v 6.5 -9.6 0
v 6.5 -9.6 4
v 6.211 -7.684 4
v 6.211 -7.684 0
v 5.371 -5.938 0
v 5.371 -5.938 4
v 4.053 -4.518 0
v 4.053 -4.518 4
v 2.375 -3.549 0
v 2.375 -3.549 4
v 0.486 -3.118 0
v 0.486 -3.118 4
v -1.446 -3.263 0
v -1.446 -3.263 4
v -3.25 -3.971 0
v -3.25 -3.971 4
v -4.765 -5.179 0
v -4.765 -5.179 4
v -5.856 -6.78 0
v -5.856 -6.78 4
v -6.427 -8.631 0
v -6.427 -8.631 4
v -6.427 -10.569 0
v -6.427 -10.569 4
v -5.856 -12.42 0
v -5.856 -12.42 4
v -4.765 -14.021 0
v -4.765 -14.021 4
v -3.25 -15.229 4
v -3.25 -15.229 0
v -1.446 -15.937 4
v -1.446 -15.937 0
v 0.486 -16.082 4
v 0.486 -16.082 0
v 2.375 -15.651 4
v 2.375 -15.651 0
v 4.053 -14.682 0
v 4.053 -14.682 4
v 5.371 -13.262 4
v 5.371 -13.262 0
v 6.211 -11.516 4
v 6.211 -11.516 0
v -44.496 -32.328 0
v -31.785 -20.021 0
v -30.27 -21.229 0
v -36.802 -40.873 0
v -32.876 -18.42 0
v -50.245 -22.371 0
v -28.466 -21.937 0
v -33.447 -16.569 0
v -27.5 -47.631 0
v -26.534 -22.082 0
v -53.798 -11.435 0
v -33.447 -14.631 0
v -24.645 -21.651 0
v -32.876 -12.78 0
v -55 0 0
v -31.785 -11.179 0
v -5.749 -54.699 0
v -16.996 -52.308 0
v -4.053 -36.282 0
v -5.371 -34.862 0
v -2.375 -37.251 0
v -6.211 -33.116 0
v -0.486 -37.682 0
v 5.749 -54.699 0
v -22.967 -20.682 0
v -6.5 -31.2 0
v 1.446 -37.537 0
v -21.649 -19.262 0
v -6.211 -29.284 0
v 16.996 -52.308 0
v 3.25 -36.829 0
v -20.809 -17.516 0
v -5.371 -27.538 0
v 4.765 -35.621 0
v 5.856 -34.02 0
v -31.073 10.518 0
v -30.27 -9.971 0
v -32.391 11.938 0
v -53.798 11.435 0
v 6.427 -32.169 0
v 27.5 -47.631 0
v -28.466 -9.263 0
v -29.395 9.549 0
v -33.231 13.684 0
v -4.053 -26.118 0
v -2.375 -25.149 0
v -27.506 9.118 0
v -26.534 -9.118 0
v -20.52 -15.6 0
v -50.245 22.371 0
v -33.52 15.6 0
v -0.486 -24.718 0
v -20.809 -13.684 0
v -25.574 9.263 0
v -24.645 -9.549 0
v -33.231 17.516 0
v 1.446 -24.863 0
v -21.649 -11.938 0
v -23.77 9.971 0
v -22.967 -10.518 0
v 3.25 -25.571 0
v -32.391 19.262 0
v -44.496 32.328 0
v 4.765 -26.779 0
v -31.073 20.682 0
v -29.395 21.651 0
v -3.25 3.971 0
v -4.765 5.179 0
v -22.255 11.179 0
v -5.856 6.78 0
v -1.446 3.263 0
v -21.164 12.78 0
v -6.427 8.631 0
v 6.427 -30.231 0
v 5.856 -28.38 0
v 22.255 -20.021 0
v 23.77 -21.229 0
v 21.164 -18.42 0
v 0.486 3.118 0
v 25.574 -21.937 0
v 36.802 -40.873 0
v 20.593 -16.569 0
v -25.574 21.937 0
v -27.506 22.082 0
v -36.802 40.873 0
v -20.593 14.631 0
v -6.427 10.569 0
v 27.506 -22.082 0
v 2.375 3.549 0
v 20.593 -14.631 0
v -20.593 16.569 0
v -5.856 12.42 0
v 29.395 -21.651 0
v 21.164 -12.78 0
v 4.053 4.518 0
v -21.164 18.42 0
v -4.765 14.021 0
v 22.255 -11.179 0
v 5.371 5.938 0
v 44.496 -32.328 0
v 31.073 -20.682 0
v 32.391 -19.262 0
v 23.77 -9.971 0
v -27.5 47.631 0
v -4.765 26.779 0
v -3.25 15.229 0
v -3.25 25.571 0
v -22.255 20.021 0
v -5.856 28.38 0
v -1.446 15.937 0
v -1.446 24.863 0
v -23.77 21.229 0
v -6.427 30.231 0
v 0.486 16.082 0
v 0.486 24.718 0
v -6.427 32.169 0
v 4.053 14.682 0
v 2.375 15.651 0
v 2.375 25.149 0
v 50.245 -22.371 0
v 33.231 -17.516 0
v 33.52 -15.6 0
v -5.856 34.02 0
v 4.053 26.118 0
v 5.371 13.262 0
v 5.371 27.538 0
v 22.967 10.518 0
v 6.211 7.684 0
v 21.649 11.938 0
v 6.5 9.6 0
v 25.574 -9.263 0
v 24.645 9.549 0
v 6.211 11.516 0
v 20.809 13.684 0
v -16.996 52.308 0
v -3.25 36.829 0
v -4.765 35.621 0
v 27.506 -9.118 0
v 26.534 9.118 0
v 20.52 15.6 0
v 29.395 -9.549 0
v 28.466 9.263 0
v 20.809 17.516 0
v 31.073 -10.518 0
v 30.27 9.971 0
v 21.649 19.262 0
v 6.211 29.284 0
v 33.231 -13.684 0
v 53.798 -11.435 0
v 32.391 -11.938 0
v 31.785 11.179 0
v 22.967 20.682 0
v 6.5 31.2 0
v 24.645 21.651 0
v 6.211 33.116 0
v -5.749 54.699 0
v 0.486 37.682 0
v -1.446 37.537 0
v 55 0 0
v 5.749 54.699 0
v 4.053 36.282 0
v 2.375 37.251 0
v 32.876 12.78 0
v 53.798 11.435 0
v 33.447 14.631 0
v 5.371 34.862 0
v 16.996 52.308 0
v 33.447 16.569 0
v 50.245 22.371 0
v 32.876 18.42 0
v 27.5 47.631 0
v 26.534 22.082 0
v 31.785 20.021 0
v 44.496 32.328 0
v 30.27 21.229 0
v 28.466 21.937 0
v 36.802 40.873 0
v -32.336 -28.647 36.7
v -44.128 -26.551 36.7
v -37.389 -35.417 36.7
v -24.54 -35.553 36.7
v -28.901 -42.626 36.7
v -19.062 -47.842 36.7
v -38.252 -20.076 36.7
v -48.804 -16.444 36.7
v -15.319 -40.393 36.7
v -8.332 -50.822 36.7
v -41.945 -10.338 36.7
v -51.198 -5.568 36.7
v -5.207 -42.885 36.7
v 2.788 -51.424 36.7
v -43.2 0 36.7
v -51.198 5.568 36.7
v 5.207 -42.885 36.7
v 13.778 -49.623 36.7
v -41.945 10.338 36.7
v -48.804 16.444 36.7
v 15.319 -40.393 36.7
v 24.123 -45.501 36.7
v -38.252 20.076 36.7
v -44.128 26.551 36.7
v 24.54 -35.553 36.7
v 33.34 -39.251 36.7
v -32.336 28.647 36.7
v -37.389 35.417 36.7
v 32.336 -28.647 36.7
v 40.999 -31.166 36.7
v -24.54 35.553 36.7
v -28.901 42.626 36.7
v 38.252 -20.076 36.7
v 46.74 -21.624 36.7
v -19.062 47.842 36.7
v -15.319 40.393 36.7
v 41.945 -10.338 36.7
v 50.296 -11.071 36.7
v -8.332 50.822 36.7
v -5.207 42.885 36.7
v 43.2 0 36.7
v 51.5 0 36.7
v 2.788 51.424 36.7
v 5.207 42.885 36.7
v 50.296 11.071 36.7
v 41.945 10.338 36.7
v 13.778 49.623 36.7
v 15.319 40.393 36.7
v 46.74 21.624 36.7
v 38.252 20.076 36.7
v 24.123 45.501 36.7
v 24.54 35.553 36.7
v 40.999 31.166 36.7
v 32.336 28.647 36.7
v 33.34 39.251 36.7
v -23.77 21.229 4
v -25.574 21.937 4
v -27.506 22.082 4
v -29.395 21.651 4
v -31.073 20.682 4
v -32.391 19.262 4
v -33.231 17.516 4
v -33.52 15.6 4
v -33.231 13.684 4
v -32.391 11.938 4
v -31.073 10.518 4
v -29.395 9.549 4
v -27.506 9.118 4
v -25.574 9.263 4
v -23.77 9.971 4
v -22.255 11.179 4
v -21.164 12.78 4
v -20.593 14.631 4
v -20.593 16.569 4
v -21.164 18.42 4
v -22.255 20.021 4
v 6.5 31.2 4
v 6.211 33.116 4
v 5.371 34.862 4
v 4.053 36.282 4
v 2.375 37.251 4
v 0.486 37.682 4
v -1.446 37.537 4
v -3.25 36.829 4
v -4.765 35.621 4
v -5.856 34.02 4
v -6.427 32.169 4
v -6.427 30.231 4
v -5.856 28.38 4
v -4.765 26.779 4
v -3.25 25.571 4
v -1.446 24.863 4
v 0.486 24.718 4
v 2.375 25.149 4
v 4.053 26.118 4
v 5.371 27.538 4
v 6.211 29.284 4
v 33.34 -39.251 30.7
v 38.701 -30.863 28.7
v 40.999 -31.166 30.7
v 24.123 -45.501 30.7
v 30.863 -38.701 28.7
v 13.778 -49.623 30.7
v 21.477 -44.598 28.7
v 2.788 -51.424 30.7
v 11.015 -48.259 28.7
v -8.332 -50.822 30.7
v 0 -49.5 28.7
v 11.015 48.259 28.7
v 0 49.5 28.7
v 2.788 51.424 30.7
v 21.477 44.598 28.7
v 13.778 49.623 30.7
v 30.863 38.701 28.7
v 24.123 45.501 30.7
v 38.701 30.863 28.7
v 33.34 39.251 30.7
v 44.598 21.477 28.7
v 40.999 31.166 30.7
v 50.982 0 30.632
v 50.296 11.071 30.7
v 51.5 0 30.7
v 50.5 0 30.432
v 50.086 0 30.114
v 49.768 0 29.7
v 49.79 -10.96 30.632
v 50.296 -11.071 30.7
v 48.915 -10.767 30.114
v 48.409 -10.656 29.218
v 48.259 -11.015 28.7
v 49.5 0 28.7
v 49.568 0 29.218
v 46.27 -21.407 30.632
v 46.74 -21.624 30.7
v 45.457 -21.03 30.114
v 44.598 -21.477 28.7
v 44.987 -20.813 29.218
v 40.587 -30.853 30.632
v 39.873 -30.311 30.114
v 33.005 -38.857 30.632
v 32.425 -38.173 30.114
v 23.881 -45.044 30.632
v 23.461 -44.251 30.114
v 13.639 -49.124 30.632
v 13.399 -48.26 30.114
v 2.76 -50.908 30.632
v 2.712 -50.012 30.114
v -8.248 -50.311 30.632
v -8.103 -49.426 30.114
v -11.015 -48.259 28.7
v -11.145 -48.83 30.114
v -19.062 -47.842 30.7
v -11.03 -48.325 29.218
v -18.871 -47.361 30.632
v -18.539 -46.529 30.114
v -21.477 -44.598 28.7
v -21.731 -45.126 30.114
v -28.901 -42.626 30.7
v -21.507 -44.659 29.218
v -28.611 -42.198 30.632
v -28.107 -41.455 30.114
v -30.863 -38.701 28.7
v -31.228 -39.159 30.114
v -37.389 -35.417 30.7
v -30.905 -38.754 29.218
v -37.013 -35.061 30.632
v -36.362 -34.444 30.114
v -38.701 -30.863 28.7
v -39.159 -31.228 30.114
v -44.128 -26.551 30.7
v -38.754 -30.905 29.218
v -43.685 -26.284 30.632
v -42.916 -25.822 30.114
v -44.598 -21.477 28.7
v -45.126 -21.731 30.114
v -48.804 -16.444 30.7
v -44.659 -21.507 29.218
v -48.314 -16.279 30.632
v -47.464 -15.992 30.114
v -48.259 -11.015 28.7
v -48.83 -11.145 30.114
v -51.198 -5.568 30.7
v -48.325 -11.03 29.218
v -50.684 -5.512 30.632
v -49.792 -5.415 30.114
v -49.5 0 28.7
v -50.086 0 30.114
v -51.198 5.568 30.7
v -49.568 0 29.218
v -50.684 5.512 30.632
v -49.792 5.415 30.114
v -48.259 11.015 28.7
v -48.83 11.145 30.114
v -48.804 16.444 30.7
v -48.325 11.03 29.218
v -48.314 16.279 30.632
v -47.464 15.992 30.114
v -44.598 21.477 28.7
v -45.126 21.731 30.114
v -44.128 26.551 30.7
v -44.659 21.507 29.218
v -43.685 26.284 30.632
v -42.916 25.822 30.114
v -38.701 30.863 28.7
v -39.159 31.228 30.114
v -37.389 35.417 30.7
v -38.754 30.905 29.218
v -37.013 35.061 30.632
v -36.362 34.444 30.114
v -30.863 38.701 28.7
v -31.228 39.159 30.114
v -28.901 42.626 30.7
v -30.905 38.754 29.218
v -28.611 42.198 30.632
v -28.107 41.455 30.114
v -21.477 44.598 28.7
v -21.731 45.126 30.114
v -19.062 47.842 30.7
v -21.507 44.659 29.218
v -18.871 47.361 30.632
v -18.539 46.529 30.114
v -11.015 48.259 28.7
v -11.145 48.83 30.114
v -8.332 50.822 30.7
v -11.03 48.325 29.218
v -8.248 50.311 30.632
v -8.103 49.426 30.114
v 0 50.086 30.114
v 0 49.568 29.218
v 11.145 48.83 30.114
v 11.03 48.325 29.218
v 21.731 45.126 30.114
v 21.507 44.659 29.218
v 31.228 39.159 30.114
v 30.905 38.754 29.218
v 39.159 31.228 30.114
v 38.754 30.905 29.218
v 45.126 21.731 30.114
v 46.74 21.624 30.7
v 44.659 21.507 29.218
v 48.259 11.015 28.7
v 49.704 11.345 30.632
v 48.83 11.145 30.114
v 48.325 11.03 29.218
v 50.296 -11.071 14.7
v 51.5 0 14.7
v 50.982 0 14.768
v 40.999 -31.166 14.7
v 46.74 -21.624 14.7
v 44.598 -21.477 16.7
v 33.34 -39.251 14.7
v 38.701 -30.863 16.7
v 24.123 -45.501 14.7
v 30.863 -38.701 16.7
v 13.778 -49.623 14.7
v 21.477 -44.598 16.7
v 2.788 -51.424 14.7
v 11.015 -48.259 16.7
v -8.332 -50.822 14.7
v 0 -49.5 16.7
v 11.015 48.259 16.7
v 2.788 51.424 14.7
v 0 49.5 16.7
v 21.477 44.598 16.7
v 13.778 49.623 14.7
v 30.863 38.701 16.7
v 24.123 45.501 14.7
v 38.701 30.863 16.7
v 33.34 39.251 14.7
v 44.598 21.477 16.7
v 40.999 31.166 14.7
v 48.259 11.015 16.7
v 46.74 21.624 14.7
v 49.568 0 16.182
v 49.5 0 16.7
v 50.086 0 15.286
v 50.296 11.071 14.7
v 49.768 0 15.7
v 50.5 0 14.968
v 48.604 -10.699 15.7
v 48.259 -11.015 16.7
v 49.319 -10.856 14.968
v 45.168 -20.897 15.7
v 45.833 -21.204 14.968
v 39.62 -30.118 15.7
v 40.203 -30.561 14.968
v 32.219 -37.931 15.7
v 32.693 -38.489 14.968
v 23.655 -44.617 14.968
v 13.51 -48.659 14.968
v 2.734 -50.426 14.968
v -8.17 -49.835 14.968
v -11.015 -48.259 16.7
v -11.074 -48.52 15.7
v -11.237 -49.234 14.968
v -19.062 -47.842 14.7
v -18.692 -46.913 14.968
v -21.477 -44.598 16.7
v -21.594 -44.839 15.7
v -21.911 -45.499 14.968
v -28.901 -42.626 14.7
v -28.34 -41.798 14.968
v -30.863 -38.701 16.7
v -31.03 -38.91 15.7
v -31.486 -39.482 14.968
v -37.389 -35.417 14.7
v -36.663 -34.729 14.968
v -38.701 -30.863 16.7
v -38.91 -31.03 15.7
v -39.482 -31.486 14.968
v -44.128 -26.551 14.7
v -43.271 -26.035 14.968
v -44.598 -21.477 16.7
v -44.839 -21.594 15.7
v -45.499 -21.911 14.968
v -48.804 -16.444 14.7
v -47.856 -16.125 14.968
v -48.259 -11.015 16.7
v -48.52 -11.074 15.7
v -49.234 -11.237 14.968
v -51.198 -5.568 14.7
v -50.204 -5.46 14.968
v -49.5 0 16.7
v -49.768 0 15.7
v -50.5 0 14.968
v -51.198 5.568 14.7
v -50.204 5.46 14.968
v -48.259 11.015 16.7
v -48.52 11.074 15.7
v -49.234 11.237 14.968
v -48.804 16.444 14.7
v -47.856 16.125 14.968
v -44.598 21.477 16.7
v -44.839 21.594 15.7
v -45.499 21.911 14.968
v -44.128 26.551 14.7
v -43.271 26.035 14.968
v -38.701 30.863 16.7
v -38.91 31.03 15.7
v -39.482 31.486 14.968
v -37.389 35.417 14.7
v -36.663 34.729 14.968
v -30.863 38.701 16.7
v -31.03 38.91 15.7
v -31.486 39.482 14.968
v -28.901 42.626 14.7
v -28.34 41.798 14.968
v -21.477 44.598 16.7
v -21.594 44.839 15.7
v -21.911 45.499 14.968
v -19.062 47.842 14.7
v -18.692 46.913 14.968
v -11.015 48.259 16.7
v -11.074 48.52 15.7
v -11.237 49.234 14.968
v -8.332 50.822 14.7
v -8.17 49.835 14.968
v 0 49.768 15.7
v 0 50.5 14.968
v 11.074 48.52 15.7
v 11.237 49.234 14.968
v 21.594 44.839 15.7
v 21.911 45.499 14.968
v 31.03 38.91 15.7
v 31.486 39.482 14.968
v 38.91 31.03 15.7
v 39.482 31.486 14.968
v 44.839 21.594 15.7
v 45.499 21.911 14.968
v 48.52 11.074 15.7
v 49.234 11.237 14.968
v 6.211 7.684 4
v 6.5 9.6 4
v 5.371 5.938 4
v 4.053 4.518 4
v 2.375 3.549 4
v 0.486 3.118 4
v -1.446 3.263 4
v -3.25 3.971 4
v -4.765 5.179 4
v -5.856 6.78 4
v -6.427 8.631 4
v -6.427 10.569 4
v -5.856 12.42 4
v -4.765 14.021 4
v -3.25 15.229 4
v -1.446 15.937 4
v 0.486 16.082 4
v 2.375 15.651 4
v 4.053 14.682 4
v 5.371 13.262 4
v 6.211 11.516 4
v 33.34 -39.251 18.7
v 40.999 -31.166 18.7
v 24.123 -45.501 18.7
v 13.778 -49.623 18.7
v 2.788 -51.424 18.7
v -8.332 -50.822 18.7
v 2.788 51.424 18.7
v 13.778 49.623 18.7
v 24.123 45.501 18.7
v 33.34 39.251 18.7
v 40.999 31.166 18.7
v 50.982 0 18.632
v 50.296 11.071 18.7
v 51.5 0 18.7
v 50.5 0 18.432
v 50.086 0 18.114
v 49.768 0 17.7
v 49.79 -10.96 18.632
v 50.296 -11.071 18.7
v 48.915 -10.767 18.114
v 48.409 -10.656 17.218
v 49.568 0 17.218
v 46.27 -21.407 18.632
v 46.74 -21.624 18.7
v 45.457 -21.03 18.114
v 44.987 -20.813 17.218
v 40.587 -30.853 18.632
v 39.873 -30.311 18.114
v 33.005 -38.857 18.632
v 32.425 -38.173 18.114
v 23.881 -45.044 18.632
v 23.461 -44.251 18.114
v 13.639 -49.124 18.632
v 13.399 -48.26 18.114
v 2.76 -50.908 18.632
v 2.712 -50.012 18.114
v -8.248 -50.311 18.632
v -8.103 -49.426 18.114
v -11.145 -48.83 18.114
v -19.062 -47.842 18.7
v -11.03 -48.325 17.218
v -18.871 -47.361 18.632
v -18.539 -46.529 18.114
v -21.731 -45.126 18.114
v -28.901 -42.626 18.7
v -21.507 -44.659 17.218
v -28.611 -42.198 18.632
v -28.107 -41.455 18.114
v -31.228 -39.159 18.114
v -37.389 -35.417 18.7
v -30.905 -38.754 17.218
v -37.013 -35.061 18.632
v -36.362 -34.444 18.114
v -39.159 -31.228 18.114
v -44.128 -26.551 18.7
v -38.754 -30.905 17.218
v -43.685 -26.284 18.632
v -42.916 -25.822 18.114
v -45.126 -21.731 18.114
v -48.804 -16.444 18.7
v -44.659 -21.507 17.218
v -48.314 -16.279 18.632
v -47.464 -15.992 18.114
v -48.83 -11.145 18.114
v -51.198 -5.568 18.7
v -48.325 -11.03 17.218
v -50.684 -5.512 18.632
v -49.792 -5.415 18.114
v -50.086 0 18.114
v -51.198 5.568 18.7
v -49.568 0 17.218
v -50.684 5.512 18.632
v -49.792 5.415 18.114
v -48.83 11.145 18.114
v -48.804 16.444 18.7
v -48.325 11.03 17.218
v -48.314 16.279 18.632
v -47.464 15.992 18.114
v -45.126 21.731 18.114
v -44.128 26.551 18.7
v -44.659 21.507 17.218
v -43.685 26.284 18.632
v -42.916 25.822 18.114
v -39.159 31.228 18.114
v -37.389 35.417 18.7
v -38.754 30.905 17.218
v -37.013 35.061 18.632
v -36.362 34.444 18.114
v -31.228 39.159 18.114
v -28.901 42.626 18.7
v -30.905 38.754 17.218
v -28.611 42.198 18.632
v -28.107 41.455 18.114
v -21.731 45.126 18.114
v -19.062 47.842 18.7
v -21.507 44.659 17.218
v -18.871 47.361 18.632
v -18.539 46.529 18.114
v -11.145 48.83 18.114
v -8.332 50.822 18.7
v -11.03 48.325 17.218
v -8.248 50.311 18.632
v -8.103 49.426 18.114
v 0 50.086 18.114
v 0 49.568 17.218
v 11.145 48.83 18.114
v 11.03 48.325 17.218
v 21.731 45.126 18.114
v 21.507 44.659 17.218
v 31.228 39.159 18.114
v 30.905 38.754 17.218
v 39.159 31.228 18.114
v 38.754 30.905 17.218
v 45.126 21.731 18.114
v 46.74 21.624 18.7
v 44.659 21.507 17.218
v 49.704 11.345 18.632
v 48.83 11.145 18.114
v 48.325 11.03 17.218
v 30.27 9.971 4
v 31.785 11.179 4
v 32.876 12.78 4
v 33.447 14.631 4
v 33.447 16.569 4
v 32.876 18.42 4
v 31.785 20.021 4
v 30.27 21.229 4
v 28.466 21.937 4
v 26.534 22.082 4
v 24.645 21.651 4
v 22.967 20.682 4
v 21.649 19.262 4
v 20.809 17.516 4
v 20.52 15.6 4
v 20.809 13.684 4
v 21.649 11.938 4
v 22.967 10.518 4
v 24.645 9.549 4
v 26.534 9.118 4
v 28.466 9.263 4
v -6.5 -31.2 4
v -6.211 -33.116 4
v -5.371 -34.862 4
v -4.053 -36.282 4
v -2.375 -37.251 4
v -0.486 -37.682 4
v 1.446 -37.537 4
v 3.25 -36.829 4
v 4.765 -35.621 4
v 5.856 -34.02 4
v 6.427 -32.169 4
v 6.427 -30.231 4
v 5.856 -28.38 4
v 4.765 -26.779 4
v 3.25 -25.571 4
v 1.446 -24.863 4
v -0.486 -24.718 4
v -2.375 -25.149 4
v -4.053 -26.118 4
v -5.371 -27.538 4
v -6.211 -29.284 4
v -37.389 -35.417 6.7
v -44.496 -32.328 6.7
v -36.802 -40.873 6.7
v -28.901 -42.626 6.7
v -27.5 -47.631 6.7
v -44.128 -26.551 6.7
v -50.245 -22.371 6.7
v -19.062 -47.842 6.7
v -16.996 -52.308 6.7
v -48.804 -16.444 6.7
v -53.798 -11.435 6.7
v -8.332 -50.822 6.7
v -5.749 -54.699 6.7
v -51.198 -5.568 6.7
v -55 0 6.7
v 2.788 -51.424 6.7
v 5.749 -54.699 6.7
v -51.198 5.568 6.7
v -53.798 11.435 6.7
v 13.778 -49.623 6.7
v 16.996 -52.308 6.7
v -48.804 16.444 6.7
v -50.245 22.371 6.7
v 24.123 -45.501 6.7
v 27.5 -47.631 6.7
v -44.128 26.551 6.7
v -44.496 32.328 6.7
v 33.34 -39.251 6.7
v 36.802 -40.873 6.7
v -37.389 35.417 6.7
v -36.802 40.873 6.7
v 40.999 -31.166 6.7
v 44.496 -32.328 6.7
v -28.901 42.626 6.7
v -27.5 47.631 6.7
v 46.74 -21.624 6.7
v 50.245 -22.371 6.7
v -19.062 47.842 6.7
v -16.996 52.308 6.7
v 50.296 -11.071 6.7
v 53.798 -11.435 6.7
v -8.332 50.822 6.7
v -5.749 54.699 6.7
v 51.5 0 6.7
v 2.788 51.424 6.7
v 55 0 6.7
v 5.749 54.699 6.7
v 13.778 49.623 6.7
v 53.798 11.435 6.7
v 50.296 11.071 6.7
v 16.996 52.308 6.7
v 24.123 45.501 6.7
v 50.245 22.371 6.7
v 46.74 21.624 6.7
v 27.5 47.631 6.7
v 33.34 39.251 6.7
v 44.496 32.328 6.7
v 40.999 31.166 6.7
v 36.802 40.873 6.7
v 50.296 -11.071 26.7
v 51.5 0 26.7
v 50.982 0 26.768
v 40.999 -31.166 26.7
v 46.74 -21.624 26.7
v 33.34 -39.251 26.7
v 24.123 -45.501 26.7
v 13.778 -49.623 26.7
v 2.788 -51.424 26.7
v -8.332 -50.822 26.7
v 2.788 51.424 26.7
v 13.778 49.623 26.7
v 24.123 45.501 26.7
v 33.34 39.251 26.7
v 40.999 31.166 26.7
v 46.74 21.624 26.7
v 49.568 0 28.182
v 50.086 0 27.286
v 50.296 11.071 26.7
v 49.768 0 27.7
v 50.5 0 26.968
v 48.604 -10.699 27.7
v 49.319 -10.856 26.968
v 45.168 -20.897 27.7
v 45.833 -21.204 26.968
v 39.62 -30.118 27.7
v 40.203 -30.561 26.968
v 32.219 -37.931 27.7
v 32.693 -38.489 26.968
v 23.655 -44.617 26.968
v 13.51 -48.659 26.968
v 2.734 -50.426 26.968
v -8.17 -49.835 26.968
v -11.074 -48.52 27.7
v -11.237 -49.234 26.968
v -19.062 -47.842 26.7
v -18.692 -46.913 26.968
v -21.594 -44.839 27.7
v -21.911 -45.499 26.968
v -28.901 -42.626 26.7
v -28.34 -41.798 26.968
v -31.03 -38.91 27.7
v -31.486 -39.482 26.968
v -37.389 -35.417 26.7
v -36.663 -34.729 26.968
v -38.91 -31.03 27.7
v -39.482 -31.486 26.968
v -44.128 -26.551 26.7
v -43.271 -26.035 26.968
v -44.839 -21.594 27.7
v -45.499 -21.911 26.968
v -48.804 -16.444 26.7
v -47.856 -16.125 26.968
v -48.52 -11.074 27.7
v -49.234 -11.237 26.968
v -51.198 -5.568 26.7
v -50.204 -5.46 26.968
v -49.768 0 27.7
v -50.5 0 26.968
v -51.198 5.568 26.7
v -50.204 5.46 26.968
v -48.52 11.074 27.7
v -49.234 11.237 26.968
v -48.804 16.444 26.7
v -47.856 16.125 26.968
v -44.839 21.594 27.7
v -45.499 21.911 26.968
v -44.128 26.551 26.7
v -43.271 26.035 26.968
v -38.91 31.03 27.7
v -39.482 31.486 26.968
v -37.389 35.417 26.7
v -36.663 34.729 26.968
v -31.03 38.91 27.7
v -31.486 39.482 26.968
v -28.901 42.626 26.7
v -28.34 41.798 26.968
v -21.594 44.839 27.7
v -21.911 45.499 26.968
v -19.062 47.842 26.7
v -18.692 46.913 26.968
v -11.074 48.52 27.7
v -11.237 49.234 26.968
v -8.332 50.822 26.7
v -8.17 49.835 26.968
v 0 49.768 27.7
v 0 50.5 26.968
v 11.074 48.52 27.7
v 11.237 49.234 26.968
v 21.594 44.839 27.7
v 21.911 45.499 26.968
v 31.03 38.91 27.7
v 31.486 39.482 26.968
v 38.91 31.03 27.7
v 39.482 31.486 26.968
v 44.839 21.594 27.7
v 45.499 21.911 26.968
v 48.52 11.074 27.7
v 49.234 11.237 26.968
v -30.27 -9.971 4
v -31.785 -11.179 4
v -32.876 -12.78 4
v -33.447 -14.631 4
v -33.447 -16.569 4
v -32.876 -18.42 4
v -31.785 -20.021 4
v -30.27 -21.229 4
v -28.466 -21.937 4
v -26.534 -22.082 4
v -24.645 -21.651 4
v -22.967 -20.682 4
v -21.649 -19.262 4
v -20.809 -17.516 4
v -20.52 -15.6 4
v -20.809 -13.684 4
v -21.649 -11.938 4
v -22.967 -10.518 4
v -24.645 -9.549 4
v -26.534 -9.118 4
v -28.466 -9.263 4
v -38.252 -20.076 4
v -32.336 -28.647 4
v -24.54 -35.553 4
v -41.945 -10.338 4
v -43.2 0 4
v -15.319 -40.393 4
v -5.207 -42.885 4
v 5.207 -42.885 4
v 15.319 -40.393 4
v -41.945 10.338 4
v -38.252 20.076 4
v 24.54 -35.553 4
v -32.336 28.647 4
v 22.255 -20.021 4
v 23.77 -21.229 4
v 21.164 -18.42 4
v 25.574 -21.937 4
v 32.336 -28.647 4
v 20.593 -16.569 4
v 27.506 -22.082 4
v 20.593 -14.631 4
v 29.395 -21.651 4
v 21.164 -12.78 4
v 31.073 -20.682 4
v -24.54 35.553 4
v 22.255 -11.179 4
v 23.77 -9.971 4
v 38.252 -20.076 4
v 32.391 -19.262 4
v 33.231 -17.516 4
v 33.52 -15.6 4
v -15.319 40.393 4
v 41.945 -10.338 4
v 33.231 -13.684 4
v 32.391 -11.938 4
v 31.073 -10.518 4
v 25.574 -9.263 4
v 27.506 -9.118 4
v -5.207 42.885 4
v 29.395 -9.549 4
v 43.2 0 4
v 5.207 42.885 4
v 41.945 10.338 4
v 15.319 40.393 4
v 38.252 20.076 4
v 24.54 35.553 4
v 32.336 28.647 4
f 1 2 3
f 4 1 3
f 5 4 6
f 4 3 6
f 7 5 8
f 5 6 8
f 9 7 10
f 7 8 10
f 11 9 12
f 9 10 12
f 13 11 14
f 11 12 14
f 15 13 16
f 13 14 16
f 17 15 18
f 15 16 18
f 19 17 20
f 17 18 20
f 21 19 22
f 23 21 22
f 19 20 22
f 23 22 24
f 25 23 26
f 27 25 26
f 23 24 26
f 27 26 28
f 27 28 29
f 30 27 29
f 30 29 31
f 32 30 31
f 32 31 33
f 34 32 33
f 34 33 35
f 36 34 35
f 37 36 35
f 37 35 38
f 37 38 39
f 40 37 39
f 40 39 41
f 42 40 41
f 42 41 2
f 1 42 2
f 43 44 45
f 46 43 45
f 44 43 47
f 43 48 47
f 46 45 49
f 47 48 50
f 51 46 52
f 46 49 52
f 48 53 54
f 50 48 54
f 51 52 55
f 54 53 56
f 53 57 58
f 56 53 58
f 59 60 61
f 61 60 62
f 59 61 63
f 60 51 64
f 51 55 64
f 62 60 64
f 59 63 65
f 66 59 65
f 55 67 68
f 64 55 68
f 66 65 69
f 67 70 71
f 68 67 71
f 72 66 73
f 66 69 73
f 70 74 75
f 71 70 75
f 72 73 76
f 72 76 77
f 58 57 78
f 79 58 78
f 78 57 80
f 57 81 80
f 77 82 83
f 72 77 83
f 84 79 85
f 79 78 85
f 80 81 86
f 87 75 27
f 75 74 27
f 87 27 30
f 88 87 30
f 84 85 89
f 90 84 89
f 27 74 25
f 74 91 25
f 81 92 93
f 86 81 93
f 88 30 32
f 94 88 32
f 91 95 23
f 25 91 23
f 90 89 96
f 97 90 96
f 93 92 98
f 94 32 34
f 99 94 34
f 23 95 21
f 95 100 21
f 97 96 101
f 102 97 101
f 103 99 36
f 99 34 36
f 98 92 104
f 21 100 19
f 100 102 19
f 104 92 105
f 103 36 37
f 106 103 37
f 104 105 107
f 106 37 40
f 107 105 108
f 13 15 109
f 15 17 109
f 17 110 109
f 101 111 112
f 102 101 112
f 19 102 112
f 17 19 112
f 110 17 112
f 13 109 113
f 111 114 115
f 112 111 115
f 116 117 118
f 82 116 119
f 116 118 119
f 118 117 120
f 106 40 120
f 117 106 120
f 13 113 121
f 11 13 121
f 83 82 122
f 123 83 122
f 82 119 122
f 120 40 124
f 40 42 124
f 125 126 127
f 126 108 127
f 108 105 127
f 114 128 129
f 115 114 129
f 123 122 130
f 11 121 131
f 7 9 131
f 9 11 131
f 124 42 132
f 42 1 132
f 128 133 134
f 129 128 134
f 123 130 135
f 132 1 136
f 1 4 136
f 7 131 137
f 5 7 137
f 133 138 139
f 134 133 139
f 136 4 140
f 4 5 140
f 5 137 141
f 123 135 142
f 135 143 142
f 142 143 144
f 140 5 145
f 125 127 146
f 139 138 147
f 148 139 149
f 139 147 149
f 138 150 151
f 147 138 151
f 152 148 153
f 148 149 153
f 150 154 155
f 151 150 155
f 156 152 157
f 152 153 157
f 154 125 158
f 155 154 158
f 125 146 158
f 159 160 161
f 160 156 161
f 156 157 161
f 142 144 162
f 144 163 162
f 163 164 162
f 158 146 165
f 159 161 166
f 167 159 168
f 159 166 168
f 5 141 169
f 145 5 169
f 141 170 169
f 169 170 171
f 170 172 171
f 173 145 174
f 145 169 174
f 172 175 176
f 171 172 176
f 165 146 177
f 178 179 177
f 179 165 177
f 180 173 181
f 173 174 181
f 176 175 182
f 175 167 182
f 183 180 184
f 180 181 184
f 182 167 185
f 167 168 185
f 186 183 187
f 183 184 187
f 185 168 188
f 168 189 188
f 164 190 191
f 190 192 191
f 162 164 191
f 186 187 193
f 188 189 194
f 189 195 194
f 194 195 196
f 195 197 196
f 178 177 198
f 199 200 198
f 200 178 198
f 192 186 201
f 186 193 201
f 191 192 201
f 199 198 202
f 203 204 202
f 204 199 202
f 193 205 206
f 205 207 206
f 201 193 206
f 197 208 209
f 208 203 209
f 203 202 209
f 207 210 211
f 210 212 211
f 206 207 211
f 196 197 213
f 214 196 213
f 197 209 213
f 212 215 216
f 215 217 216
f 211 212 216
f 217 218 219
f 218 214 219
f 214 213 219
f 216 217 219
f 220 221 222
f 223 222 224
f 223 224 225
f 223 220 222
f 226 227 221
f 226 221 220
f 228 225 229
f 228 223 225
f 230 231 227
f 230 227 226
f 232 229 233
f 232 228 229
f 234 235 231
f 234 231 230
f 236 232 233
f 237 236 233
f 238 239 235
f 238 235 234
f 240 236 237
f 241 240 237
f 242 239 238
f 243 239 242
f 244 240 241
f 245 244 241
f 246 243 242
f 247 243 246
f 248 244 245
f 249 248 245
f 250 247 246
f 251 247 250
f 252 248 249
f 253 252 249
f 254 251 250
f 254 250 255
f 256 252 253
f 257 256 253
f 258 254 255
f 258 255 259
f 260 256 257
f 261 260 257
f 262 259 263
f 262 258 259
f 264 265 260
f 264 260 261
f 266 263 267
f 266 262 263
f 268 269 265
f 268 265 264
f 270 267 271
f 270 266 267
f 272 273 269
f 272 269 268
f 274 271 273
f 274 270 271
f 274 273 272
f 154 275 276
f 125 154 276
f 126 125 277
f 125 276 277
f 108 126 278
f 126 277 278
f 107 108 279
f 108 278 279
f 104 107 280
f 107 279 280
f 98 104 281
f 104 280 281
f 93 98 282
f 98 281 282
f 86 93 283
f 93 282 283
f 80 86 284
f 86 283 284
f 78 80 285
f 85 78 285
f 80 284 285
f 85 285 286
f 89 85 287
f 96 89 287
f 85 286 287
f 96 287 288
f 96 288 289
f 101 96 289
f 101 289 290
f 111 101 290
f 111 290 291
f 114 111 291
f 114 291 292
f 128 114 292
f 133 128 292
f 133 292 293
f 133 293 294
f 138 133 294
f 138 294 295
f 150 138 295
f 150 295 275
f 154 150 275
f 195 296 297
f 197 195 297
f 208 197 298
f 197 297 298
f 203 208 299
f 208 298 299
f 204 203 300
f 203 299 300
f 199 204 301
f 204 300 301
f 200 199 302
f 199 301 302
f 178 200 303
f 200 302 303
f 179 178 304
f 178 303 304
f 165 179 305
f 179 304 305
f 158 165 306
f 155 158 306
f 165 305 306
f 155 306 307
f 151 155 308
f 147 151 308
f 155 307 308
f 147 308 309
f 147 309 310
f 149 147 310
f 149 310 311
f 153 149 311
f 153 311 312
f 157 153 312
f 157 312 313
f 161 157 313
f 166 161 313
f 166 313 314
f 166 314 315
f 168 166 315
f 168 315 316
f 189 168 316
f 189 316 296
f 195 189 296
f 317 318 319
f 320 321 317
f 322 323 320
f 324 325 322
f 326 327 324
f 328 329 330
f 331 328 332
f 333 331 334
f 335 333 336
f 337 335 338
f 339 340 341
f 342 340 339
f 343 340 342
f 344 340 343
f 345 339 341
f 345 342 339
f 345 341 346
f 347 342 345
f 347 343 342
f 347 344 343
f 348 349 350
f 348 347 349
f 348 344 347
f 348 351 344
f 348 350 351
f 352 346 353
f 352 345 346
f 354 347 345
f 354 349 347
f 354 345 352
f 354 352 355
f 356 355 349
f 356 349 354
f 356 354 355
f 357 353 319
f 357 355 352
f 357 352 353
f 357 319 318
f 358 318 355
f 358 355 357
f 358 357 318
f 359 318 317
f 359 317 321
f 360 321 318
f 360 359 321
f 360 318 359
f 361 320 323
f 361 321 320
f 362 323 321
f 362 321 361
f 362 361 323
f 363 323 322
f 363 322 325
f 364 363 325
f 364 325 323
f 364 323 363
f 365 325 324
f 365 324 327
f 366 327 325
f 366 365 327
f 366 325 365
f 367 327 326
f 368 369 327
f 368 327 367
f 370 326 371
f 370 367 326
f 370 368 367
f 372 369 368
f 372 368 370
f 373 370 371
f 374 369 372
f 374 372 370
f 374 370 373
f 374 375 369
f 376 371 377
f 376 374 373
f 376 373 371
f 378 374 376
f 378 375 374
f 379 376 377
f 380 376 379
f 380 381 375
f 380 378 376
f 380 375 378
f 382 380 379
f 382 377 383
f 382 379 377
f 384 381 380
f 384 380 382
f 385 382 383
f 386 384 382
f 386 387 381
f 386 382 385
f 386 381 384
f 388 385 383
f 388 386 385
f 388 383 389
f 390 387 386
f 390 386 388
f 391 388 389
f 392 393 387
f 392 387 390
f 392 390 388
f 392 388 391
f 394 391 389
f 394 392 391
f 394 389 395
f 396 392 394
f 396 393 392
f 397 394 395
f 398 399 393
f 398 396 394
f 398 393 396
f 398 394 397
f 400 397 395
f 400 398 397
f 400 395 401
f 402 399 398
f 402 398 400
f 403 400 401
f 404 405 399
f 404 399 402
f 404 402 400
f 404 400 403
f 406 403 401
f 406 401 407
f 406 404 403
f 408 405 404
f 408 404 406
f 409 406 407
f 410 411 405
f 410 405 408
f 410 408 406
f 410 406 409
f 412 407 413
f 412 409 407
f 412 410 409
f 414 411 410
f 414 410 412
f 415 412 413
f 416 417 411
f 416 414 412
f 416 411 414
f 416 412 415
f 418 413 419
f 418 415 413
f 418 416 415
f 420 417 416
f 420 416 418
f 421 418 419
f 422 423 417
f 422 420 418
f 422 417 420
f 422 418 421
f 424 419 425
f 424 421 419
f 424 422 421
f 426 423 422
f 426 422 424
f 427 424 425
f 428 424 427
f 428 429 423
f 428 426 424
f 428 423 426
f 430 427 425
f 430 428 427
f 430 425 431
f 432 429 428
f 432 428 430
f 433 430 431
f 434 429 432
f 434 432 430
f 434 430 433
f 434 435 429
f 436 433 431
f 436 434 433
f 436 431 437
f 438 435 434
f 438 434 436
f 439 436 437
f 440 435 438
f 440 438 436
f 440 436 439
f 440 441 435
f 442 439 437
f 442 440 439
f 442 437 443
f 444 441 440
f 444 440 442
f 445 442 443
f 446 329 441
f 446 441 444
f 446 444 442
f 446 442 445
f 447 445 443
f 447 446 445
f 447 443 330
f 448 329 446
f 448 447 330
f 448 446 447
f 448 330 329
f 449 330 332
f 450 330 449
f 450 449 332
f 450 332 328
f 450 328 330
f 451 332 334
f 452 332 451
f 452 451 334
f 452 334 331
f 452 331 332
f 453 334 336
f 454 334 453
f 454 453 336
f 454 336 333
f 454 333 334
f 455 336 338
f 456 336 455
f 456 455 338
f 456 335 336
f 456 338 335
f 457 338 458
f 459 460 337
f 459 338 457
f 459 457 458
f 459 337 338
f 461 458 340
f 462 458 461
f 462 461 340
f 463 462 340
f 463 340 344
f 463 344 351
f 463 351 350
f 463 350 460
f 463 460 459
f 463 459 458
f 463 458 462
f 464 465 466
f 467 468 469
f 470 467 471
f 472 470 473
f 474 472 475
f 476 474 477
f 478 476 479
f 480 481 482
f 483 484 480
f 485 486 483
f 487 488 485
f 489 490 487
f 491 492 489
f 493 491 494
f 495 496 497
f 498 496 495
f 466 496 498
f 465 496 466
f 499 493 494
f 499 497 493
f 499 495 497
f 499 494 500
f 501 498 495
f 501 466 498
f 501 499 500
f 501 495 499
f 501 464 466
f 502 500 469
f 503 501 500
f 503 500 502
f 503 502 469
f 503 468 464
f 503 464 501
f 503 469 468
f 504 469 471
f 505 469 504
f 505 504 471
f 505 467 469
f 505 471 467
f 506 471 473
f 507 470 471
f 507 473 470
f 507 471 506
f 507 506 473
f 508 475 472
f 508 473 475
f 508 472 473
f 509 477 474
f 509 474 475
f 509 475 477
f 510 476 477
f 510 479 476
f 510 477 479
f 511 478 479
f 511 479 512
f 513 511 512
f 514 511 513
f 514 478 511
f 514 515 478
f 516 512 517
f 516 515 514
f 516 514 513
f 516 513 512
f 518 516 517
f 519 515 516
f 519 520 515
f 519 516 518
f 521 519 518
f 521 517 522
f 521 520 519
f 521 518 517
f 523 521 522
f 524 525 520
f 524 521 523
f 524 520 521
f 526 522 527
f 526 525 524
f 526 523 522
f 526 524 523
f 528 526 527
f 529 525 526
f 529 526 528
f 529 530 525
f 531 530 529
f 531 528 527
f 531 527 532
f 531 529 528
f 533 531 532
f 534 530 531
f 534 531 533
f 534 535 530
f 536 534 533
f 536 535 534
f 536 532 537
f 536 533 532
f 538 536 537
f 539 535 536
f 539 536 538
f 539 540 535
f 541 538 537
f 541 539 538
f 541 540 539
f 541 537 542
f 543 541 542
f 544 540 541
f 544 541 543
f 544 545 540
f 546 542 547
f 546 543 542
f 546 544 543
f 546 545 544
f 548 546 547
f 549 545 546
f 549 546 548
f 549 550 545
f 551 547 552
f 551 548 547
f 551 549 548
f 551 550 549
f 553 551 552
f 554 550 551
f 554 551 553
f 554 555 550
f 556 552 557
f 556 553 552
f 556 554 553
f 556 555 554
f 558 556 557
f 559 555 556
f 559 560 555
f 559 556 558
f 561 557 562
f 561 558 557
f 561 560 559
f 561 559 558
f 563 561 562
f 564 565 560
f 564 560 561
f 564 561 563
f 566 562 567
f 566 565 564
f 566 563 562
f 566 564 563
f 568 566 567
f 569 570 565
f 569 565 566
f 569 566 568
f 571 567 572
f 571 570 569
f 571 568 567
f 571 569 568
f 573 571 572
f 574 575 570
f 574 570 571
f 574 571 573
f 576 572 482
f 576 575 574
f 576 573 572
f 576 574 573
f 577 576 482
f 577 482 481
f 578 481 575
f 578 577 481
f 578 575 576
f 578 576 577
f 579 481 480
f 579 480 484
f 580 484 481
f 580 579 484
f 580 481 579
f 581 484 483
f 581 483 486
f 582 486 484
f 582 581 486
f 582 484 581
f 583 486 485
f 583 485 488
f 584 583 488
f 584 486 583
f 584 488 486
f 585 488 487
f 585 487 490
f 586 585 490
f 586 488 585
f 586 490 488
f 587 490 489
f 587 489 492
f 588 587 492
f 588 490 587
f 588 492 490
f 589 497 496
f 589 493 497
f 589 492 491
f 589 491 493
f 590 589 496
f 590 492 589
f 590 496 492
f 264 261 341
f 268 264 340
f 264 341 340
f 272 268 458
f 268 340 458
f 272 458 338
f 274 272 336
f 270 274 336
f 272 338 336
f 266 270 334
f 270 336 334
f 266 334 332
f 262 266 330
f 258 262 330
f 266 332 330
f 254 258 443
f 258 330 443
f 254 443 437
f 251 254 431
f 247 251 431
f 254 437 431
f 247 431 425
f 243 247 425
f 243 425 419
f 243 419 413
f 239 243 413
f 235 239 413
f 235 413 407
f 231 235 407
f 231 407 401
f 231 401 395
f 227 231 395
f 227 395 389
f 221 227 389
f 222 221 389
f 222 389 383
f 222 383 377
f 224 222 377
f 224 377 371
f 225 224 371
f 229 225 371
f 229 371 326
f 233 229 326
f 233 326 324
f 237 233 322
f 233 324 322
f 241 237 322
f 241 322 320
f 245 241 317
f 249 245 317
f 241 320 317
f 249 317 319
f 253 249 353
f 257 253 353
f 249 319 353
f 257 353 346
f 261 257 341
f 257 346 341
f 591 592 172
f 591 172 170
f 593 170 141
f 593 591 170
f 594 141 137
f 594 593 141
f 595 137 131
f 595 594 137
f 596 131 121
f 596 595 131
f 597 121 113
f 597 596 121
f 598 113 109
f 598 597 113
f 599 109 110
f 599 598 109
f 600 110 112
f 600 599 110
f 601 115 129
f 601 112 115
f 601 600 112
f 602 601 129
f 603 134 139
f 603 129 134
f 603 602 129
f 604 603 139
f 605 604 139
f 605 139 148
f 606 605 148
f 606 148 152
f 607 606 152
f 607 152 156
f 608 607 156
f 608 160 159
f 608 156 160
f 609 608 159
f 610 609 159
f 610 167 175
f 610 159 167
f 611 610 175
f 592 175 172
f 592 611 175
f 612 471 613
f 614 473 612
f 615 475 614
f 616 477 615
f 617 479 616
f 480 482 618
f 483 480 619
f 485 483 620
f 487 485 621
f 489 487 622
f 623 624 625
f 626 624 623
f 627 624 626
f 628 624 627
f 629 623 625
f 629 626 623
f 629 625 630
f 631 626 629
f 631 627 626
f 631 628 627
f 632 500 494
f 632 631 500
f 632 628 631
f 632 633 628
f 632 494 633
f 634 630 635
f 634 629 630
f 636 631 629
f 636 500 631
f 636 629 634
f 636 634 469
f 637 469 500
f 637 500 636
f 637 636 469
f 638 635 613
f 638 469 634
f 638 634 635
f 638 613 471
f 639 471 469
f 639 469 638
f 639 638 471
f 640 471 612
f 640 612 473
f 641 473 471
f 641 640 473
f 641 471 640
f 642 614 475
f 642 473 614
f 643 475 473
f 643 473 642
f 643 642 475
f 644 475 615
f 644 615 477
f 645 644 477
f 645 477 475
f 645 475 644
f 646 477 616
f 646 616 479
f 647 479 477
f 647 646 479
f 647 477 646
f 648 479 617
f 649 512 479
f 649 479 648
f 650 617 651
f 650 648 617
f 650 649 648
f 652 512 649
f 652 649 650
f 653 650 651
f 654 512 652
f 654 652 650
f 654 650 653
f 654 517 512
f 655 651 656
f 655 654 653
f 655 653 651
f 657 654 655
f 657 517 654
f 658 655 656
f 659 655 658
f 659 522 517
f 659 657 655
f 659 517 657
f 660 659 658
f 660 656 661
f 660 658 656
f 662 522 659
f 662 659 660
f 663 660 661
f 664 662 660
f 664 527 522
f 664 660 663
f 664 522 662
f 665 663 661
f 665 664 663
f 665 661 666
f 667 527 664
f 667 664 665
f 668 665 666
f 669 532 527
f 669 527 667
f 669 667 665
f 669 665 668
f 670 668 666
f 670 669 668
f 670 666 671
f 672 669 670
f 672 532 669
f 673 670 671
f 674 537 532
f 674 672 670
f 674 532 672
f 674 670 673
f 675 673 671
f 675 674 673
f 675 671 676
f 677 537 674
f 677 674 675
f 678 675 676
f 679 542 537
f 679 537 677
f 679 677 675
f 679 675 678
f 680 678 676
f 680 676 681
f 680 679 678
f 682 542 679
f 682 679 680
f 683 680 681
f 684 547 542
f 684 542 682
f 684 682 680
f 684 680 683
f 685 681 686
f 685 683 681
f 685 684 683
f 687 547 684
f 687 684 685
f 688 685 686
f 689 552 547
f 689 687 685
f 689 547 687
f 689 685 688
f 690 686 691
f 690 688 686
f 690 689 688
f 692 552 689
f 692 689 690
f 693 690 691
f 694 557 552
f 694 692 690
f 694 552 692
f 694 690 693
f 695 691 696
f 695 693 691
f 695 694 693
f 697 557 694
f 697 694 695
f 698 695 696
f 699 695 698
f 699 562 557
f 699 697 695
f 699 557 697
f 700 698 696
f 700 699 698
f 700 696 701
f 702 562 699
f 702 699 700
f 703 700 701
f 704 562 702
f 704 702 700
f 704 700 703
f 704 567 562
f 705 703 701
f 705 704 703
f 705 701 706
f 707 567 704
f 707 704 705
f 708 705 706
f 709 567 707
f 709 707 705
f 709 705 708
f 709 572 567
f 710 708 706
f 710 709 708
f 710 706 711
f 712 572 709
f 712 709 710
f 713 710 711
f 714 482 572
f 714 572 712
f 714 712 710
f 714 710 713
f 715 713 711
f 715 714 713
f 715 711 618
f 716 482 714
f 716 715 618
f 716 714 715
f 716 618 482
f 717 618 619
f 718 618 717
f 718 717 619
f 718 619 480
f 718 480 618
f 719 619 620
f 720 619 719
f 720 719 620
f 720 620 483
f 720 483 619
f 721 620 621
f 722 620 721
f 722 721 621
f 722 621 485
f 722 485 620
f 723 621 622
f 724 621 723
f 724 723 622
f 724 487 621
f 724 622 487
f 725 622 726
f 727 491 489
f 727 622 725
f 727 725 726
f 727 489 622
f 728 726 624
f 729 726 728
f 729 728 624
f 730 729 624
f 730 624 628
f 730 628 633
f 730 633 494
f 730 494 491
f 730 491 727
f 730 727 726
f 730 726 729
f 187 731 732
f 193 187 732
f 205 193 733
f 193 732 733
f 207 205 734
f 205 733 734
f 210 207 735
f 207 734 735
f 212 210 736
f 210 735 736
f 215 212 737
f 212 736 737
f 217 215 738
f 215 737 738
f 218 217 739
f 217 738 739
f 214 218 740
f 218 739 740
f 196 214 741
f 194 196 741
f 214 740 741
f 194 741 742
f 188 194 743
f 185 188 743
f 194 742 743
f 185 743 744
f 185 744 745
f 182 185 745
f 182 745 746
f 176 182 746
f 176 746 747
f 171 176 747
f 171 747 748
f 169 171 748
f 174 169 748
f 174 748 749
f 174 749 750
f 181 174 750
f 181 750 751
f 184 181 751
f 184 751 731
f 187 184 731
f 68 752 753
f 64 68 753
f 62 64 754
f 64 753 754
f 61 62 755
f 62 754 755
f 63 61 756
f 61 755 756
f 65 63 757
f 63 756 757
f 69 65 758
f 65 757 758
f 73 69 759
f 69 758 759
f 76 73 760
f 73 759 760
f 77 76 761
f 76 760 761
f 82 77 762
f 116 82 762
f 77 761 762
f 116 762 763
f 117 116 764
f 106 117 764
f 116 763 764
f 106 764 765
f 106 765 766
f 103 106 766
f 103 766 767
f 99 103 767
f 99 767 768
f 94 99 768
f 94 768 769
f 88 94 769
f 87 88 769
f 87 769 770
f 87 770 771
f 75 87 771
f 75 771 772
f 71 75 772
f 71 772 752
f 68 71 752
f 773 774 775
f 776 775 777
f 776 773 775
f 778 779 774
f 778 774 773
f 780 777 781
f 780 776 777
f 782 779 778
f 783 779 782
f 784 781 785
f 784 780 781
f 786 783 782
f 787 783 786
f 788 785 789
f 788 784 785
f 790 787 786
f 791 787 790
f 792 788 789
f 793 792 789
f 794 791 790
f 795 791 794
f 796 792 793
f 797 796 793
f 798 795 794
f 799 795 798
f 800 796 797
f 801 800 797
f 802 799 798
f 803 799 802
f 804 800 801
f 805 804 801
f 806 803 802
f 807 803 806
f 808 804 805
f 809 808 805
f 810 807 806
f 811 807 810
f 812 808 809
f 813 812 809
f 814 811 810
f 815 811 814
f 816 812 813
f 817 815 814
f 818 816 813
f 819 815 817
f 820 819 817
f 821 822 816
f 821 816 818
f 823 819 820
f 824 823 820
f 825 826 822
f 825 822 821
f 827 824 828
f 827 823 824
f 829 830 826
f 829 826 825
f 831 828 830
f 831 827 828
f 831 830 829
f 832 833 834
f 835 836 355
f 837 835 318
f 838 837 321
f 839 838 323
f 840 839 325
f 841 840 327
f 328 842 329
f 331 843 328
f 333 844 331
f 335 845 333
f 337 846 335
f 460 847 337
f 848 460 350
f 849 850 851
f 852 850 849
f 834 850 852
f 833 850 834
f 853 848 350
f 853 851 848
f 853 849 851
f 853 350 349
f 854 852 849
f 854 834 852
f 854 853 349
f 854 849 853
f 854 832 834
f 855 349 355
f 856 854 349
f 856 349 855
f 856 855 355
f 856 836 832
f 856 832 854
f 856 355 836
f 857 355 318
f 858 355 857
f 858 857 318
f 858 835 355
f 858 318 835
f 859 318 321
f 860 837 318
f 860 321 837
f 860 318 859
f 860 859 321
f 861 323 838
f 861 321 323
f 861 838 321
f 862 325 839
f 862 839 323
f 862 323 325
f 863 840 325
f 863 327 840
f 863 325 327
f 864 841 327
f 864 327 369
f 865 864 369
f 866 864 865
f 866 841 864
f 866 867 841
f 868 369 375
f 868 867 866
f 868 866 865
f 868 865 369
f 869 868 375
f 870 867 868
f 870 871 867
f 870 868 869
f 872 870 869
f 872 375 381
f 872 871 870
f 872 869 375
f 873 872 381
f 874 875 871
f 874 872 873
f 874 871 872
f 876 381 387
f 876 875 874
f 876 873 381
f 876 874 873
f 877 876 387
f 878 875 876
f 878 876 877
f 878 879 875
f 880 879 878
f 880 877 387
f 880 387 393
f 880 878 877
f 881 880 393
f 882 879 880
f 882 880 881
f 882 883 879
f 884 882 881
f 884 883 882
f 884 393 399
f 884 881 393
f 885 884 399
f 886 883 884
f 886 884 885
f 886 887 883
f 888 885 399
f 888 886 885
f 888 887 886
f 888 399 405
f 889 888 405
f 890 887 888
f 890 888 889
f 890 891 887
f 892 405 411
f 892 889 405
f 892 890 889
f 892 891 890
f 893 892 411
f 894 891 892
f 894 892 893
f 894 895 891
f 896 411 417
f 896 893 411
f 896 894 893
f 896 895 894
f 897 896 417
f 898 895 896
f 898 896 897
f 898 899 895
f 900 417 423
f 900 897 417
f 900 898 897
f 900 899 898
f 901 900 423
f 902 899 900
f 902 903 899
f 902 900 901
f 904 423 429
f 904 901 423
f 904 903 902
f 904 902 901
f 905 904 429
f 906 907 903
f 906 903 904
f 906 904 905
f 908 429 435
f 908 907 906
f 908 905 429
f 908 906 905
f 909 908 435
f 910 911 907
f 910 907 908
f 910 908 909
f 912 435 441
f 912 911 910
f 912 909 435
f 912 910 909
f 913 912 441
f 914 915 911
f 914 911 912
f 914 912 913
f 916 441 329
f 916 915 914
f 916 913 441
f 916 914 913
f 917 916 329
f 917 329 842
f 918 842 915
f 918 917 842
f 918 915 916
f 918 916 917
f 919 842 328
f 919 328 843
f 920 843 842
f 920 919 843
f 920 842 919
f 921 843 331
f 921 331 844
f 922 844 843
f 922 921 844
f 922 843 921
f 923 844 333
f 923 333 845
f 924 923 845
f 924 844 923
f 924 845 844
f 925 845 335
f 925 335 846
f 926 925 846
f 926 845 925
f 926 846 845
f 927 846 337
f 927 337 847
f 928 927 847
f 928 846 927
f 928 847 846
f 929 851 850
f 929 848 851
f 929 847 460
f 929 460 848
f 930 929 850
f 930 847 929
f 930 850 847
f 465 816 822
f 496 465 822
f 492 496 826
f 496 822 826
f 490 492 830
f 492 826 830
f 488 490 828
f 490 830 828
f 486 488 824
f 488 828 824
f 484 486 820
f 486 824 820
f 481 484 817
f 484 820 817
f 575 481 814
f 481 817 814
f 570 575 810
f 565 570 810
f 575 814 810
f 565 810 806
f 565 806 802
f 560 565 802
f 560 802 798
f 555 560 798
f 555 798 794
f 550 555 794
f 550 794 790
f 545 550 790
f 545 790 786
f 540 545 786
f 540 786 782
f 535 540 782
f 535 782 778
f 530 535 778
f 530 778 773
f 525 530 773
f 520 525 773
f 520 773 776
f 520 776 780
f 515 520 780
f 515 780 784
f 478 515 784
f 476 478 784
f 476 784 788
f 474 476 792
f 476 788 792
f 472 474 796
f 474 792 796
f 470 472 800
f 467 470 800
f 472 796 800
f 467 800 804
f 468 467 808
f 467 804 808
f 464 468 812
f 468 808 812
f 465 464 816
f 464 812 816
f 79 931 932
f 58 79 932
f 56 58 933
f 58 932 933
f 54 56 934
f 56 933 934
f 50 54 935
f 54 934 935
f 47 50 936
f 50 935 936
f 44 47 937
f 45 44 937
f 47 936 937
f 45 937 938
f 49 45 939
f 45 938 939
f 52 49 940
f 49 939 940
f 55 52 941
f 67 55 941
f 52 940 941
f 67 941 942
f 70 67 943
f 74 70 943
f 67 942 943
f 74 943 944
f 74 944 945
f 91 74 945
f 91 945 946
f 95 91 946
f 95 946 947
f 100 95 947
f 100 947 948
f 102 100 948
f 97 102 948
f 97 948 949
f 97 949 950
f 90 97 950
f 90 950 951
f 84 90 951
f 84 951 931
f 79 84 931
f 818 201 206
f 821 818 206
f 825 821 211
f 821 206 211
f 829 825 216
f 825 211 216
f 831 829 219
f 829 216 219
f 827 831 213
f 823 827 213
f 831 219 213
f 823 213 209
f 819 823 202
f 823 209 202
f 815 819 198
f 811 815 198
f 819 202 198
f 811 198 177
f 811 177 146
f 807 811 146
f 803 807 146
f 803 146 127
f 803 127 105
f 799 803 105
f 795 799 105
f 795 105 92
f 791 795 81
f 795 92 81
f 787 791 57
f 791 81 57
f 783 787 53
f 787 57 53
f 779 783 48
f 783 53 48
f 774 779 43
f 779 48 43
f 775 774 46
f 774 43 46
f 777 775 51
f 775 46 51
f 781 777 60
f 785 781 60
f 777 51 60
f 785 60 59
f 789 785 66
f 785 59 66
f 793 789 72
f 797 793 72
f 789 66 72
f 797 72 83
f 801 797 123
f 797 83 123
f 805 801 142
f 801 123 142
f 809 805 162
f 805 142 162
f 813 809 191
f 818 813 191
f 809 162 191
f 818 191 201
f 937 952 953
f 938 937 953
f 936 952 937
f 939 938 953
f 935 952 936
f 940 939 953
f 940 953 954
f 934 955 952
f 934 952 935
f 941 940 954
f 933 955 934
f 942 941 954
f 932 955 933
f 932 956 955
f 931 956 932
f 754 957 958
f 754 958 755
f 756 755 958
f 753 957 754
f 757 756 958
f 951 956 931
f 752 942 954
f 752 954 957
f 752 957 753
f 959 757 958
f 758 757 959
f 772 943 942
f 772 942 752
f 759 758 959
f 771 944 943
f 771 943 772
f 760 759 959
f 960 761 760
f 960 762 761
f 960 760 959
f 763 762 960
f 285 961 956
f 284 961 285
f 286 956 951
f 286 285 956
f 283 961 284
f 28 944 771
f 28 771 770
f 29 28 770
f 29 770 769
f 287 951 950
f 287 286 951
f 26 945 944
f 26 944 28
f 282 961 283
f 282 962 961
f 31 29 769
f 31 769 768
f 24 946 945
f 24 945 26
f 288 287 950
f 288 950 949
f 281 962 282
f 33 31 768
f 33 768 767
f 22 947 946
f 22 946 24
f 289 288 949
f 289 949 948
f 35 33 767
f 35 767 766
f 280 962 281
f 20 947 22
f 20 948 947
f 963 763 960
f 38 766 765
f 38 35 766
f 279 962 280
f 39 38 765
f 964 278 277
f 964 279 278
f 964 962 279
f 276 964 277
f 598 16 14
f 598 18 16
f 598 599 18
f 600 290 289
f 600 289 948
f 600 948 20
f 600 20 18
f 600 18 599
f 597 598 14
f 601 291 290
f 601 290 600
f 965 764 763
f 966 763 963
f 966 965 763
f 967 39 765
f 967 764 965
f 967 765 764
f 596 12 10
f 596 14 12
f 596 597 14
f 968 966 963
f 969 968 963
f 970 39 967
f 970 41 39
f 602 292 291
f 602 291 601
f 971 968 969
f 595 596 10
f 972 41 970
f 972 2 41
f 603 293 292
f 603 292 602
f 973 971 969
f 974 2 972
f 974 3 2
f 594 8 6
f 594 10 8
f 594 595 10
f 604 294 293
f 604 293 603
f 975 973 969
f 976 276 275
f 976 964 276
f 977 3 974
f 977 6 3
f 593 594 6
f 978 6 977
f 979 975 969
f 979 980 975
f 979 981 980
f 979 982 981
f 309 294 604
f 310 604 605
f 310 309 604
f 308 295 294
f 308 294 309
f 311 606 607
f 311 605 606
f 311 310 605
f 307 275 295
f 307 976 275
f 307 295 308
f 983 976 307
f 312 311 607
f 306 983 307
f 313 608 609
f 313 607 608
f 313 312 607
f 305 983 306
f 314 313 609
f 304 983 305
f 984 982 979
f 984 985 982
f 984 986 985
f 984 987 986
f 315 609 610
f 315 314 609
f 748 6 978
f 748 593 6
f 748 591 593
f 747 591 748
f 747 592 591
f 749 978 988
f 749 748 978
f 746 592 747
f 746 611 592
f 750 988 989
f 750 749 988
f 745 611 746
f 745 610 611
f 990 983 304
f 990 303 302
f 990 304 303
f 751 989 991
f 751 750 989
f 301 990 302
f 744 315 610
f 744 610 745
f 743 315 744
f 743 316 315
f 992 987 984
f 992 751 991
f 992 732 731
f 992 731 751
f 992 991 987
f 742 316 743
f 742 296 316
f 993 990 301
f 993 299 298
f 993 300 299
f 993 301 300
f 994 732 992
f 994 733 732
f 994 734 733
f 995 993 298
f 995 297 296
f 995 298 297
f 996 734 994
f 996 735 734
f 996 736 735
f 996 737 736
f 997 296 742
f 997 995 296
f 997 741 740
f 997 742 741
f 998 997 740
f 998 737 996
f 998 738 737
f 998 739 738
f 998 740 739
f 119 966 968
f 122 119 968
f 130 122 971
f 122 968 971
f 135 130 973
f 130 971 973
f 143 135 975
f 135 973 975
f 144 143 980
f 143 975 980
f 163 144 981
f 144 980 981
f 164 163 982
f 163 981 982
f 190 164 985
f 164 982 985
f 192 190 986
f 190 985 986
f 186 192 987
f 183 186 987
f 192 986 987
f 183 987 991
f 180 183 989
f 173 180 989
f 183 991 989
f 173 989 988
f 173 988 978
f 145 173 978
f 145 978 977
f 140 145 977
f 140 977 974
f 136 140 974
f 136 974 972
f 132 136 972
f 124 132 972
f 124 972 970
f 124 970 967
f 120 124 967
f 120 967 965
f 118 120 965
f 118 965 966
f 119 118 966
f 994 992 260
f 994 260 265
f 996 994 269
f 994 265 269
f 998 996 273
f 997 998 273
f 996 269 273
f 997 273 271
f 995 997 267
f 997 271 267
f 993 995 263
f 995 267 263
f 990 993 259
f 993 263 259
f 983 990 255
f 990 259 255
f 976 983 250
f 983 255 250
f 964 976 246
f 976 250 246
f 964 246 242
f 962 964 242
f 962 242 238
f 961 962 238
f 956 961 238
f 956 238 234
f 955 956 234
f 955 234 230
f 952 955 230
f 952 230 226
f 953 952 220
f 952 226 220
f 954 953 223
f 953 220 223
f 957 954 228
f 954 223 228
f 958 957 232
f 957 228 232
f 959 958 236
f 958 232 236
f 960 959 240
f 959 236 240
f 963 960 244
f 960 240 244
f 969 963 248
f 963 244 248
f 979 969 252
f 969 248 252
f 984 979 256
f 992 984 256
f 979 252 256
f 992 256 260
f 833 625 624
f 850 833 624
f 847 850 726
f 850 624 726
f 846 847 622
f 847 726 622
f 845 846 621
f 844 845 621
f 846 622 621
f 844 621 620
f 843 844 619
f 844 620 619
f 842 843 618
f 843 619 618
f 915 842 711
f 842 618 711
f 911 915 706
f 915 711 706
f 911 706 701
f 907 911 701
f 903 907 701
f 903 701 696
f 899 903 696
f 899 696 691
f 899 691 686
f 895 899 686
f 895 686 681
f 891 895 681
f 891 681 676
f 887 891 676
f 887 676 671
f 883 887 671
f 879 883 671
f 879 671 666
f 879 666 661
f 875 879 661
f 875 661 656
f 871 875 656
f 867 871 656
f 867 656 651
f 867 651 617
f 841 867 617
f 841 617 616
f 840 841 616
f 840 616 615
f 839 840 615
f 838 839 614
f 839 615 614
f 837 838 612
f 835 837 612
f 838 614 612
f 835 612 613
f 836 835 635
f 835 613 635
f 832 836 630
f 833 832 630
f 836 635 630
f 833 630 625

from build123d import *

# Parameters (mm, degrees)
CROQUIS1_R                    = 55
SALIENTE_EXTRUIR1_DEPTH       = 6.7
CROQUIS2_R                    = 51.5
SALIENTE_EXTRUIR2_DEPTH       = 30
CROQUIS3_R                    = 2
CROQUIS4_R                    = 43.2
CORTAR_EXTRUIR1_DEPTH         = 32.7
TALADRO_DE_MARGEN_PARA_M121_D = 13
MATRIZC1_COUNT                = 6
TALADRO_DE_MARGEN_PARA_M122_D = 13


with BuildPart() as part:
    # Croquis1 → Saliente-Extruir1 (new body)
    with BuildSketch(Plane.XY):
        Circle(CROQUIS1_R)
    extrude(amount=SALIENTE_EXTRUIR1_DEPTH)

    # Croquis2 → Saliente-Extruir2 (add)
    with BuildSketch(Plane.XY.offset(6.7)):
        Circle(CROQUIS2_R)
    extrude(amount=SALIENTE_EXTRUIR2_DEPTH)

    # Croquis3 → Cortar-Revolución1 (revolve, cut)
    with BuildSketch(Plane(origin=(0, 0, 0), x_dir=(1, 0, 0), z_dir=(0, 1, 0)), mode=Mode.PRIVATE) as cortar_revoluci_n1_sk:
        with Locations((-51.5, -16.7)):
            Circle(CROQUIS3_R)
        with Locations((-51.5, -28.7)):
            Circle(CROQUIS3_R)
    revolve(cortar_revoluci_n1_sk.sketch.rotate(Axis((0, 0, 36.878025431), (0, 0, -1)), 180), axis=Axis((0, 0, 36.878025431), (0, 0, -1)), mode=Mode.SUBTRACT)

    # Croquis4 → Cortar-Extruir1 (cut)
    with BuildSketch(Plane.XY.offset(36.7)):
        Circle(CROQUIS4_R)
    extrude(amount=-CORTAR_EXTRUIR1_DEPTH, mode=Mode.SUBTRACT)

    # Taladro de margen para M121 (through all)
    with Locations(Plane(origin=(0, 0, 0), x_dir=(-1, 0, 0), z_dir=(0, 0, -1))):
        with Locations((0, 31.2)):
            taladro_de_margen_para_m121 = Hole(TALADRO_DE_MARGEN_PARA_M121_D / 2)

    # MatrizC1: Taladro de margen para M121 ×6 about axis
    matrizc1_axis = Axis((0, 0, 0), (0, 0, 1))
    for i in range(1, MATRIZC1_COUNT):
        add(taladro_de_margen_para_m121.rotate(matrizc1_axis, i * 360 / MATRIZC1_COUNT), mode=Mode.SUBTRACT)

    # Taladro de margen para M122 (through all)
    with Locations(Plane(origin=(0, 0, 0), x_dir=(-1, 0, 0), z_dir=(0, 0, -1))):
        with Locations((0, -9.6)):
            taladro_de_margen_para_m122 = Hole(TALADRO_DE_MARGEN_PARA_M122_D / 2)

    # Simetría1: Taladro de margen para M122 across plane
    add(taladro_de_margen_para_m122.mirror(Plane.ZX), mode=Mode.SUBTRACT)


solid = part.part
